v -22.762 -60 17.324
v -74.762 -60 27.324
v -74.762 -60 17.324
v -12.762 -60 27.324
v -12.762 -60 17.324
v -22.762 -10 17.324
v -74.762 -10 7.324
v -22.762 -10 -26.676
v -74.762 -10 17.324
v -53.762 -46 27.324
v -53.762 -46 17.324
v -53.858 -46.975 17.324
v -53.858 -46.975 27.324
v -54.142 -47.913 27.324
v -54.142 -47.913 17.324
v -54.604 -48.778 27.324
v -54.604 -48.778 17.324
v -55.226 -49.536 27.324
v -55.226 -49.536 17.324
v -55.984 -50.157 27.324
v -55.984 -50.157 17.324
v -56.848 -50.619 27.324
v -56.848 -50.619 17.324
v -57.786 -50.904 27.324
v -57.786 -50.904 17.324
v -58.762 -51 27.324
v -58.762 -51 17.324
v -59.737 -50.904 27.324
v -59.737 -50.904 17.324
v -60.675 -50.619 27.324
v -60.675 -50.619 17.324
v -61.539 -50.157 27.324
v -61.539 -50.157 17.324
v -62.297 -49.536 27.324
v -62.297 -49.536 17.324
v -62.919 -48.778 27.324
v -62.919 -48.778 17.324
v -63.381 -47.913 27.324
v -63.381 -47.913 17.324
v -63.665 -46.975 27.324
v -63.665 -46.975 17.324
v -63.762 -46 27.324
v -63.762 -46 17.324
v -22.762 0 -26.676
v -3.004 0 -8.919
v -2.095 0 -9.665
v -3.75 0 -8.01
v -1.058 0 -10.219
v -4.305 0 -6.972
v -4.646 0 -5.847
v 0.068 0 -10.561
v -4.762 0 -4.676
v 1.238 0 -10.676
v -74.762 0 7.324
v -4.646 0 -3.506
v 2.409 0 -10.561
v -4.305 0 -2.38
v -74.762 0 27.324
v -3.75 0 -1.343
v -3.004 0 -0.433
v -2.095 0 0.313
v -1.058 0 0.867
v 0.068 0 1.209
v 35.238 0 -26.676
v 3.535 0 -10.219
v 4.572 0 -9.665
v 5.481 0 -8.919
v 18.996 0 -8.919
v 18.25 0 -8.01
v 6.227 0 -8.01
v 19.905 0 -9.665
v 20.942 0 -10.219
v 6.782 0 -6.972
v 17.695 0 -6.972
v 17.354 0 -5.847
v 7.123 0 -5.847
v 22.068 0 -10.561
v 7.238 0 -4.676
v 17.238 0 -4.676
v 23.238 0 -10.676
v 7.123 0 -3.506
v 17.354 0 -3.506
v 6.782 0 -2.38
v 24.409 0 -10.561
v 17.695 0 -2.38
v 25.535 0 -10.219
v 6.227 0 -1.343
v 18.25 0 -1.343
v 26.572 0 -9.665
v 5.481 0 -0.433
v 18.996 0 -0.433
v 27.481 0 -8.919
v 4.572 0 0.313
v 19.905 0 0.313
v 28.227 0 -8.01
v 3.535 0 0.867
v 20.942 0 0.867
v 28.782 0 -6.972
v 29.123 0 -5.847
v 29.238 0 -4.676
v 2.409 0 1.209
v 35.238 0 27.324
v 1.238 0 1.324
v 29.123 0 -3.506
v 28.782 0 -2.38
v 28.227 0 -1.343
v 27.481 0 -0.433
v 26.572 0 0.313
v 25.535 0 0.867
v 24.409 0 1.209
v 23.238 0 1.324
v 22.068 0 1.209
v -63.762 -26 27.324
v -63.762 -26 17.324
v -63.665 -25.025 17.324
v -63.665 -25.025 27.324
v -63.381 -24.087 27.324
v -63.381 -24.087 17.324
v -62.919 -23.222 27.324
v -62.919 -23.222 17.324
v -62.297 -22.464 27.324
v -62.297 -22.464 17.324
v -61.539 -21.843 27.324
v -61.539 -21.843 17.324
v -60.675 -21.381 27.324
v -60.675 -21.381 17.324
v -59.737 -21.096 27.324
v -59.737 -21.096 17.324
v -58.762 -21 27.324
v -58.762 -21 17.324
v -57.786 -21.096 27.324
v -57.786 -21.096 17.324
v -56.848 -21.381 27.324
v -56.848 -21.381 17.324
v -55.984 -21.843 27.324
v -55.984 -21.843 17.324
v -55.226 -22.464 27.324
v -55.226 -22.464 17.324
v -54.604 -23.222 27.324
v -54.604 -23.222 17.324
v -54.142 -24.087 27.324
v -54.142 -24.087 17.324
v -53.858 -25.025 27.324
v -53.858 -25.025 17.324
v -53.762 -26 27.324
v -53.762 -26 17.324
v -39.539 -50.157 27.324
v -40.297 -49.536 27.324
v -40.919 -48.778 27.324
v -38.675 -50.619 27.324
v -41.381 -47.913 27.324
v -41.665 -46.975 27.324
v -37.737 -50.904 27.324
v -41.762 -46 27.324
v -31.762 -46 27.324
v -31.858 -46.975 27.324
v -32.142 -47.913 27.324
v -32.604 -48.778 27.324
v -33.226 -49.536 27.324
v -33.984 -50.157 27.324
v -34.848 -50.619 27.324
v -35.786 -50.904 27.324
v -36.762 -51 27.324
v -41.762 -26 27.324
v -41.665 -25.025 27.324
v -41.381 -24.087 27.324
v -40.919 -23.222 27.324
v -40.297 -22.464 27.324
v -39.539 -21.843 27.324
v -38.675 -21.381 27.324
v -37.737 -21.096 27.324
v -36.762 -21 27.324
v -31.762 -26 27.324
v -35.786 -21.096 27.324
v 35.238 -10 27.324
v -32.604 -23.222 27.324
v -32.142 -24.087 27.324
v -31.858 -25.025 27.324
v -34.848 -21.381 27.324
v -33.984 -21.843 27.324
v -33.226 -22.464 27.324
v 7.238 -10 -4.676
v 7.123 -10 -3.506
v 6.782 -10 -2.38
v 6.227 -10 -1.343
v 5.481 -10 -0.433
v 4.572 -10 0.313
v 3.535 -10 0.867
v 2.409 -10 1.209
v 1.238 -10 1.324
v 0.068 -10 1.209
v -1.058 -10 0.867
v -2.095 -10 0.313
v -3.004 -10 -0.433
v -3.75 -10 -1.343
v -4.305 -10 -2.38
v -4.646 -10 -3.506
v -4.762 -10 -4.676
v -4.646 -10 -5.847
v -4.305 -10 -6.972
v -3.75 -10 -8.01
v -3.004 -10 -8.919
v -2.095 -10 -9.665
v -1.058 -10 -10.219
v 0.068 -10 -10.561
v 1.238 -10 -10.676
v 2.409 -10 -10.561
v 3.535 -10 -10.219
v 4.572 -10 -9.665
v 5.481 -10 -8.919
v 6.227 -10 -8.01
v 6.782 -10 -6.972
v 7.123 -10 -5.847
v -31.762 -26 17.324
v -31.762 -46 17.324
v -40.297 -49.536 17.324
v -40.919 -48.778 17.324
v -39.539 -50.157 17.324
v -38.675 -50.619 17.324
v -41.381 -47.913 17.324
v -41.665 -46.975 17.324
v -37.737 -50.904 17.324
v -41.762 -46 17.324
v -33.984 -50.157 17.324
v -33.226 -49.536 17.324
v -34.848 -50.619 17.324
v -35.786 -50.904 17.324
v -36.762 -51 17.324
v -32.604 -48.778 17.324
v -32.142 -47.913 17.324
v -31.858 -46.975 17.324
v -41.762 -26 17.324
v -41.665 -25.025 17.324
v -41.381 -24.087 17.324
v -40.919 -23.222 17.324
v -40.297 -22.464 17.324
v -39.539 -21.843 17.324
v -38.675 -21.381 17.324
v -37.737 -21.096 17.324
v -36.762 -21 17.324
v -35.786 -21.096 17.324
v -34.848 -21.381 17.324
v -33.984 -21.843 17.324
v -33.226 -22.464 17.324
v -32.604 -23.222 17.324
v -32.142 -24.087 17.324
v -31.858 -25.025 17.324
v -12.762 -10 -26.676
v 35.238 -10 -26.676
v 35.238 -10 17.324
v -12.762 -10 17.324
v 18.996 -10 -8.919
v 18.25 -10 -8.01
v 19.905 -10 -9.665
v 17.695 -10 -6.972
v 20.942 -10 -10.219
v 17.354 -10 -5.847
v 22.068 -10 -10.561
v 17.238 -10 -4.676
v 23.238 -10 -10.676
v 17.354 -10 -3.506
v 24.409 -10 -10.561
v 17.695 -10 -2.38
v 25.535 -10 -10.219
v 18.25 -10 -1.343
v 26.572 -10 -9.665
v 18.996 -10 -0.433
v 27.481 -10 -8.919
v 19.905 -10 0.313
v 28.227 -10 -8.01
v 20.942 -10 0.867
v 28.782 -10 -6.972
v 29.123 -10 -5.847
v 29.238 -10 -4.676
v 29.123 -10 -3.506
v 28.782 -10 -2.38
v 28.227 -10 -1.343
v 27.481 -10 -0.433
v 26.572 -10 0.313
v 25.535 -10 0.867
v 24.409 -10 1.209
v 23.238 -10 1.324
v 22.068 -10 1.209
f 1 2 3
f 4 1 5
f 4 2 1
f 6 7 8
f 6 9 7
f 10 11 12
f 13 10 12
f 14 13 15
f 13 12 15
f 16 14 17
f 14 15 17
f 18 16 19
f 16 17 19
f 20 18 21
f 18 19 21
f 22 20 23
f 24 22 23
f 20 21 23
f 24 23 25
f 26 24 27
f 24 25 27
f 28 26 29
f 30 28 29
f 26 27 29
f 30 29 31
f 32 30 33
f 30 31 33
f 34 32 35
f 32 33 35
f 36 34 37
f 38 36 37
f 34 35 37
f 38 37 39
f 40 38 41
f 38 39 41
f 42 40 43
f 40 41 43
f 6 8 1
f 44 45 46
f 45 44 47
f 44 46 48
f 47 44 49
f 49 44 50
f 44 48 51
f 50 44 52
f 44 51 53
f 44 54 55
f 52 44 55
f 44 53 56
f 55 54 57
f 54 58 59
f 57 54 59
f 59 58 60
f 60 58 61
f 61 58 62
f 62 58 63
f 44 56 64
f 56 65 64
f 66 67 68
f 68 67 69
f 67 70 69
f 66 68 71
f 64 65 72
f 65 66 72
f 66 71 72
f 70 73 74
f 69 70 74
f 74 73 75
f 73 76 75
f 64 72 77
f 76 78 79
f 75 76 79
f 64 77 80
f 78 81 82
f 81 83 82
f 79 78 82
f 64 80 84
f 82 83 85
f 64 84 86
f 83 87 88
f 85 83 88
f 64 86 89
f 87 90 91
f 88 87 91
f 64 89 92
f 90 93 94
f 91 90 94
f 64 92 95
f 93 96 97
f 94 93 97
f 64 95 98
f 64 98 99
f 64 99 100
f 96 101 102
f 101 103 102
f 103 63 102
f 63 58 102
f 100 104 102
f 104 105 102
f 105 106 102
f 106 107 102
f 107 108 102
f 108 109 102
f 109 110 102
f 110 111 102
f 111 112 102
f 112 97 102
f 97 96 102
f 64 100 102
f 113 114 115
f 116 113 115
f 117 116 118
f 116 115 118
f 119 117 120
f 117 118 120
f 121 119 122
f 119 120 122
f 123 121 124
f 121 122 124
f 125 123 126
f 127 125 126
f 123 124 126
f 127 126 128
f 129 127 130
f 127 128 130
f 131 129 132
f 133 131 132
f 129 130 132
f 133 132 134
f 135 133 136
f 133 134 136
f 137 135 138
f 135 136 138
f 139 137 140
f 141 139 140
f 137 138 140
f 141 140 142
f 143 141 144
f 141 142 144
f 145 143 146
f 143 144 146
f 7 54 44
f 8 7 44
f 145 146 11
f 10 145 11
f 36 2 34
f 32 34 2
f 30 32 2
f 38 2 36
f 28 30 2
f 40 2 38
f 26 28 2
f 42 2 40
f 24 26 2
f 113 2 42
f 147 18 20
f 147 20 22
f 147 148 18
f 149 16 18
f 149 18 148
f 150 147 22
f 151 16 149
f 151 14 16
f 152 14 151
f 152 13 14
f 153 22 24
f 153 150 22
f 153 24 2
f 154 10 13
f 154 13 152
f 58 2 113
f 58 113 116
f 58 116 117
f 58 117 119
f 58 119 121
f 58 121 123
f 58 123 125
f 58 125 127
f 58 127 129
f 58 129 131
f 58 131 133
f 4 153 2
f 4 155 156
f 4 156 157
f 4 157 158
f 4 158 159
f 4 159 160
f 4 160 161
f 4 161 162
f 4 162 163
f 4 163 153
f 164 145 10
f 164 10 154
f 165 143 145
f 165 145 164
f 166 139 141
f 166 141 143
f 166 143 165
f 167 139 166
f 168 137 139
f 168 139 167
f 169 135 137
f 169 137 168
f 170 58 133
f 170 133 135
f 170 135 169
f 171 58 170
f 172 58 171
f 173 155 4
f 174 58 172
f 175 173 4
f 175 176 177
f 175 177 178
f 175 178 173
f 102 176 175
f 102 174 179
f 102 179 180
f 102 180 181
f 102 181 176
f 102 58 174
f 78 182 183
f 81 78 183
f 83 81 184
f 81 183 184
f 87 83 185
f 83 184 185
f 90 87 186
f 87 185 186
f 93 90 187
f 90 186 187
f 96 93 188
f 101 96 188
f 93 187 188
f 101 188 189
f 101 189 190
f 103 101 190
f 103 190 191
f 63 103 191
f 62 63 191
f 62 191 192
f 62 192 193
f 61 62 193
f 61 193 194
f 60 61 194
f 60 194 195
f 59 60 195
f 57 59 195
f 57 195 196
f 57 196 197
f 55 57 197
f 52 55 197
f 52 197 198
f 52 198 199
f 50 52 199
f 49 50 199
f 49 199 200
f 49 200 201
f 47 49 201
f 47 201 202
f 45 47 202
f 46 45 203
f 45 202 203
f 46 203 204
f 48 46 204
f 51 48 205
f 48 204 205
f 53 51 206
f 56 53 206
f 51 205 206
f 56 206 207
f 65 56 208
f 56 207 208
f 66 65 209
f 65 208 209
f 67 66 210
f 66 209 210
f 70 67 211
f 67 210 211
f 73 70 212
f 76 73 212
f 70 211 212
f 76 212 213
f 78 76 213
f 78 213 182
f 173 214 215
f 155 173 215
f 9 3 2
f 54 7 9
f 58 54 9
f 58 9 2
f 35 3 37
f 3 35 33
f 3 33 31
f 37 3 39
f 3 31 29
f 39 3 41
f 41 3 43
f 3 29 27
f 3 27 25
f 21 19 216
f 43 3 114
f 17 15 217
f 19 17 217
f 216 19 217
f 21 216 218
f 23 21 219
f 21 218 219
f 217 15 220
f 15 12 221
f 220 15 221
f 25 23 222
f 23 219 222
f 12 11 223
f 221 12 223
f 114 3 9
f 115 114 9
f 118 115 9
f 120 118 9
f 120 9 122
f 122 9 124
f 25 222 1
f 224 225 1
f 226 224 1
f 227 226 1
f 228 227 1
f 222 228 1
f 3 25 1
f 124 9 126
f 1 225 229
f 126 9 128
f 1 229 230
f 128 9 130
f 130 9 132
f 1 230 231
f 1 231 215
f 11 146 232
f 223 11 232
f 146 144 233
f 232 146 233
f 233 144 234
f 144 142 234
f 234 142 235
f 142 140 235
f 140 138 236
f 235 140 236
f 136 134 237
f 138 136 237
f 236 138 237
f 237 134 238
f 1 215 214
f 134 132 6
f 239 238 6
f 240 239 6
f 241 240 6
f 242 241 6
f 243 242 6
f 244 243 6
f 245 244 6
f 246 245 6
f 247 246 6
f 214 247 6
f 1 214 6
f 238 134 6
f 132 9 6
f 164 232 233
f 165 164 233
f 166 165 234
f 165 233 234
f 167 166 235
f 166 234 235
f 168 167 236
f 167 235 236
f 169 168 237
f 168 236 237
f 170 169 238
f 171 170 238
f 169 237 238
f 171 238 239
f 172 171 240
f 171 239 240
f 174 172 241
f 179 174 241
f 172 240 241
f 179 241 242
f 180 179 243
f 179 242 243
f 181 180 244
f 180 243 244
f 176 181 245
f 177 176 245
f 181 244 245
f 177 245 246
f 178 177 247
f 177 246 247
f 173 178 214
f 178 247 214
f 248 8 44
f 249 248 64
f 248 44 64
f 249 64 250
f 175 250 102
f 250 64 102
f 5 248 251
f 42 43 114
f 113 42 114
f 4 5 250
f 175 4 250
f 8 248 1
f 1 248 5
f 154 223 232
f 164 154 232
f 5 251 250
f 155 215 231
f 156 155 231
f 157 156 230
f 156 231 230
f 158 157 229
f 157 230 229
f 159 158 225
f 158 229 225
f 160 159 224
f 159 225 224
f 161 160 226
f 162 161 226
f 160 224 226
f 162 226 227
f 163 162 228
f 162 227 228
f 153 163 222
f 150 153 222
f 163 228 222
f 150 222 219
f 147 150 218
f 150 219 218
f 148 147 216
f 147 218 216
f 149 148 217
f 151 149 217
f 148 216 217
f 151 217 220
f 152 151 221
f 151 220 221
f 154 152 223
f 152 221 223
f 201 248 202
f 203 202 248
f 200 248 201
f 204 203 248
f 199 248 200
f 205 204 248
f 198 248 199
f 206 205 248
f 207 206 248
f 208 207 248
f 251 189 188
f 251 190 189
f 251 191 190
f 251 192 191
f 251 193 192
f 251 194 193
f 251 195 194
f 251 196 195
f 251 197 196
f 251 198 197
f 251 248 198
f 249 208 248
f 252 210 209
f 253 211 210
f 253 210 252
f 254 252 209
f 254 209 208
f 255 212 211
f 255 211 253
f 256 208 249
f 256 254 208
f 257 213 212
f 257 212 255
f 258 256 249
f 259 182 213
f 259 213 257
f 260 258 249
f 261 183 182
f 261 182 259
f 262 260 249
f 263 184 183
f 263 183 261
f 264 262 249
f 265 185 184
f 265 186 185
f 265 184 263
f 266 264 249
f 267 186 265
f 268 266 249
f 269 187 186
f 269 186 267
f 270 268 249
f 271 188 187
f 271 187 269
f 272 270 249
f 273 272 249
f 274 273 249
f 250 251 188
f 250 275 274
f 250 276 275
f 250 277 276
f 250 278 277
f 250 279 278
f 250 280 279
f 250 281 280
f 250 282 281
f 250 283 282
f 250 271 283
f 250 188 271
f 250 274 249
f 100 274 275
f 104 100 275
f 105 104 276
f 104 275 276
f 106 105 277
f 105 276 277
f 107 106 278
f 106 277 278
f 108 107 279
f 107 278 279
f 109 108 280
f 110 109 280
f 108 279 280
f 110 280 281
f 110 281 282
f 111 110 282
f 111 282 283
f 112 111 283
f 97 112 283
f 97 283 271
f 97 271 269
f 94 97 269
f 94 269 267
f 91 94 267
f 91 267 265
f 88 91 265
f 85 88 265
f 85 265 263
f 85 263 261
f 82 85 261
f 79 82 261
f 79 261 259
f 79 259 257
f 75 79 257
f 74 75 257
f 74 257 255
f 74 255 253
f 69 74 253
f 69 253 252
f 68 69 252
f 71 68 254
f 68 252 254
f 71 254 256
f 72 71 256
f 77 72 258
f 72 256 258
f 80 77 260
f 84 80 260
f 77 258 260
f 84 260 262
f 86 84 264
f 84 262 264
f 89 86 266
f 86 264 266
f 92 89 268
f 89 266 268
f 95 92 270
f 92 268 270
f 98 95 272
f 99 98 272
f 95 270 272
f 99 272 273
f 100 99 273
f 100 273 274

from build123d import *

# Parameters (mm, degrees)
F1_DEPTH  = 10
F2_W      = 110
F2_H      = 10
F3_DEPTH  = 50
F4_W      = 10
F4_H      = 44
F5_DEPTH  = 50
F7_DEPTH  = 11
F9_DEPTH  = 25
F10_R     = 6
F11_DEPTH = 11
F13_DEPTH = 11


with BuildPart() as f1:
    # F0 (on Front) → F1 (new body)
    with BuildSketch(Plane.XZ):
        Polygon((35.2384935319, 27.3238807813), (-74.7615064681, 27.3238807813), (-74.7615064681, 7.3238807813), (-22.7615064681, -26.6761192187), (35.2384935319, -26.6761192187), align=None)
    extrude(amount=F1_DEPTH)

    # F2 (on face) → F3 (join)
    with BuildSketch(Plane.XZ.offset(10)):
        with Locations((-19.7615064681, 22.3238807813)):
            Rectangle(F2_W, F2_H)
    extrude(amount=F3_DEPTH)

    # F4 (on face) → F5 (join)
    with BuildSketch(Plane.XZ.offset(10)):
        with Locations((-17.7615064681, -4.6761192187)):
            Rectangle(F4_W, F4_H)
    extrude(amount=F5_DEPTH)

    # F6 (on face) → F7 (cut)
    with BuildSketch(Plane.YZ.offset(-12.7615064681)):
        Polygon((-10, -26.6761192187), (-60, 17.3238807813), (-60, -26.6761192187), align=None)
    extrude(amount=-F7_DEPTH, mode=Mode.SUBTRACT)

    # F8 (on face) → F9 (cut)
    with BuildSketch(Plane(origin=(0, 0, 17.3238807813), x_dir=(1, 0, 0), z_dir=(0, 0, -1))):
        Polygon((35.2384935319, 60), (-12.7615064681, 60), (35.2384935319, 10), align=None)
    extrude(amount=-F9_DEPTH, mode=Mode.SUBTRACT)

    # F10 (on face) → F11 (cut)
    with BuildSketch(Plane.XZ.offset(10)):
        with Locations((23.2384935319, -4.6761192187)):
            Circle(F10_R)
        with Locations((1.2384935319, -4.6761192187)):
            Circle(F10_R)
    extrude(amount=-F11_DEPTH, mode=Mode.SUBTRACT)

    # F12 (on face) → F13 (cut)
    with BuildSketch(Plane(origin=(0, 0, 17.3238807813), x_dir=(1, 0, 0), z_dir=(0, 0, -1))):
        with BuildLine():
            ThreePointArc((-53.7615064681, 46), (-58.7615064681, 51), (-63.7615064681, 46))
            Line((-63.7615064681, 46), (-63.7615064681, 26))
            ThreePointArc((-63.7615064681, 26), (-58.7615064681, 21), (-53.7615064681, 26))
            Line((-53.7615064681, 26), (-53.7615064681, 46))
        make_face()
        with BuildLine():
            Line((-41.7615064681, 46), (-41.7615064681, 26))
            ThreePointArc((-41.7615064681, 26), (-36.7615064681, 21), (-31.7615064681, 26))
            Line((-31.7615064681, 26), (-31.7615064681, 46))
            ThreePointArc((-31.7615064681, 46), (-36.7615064681, 51), (-41.7615064681, 46))
        make_face()
    extrude(amount=-F13_DEPTH, mode=Mode.SUBTRACT)


solid = f1.part
